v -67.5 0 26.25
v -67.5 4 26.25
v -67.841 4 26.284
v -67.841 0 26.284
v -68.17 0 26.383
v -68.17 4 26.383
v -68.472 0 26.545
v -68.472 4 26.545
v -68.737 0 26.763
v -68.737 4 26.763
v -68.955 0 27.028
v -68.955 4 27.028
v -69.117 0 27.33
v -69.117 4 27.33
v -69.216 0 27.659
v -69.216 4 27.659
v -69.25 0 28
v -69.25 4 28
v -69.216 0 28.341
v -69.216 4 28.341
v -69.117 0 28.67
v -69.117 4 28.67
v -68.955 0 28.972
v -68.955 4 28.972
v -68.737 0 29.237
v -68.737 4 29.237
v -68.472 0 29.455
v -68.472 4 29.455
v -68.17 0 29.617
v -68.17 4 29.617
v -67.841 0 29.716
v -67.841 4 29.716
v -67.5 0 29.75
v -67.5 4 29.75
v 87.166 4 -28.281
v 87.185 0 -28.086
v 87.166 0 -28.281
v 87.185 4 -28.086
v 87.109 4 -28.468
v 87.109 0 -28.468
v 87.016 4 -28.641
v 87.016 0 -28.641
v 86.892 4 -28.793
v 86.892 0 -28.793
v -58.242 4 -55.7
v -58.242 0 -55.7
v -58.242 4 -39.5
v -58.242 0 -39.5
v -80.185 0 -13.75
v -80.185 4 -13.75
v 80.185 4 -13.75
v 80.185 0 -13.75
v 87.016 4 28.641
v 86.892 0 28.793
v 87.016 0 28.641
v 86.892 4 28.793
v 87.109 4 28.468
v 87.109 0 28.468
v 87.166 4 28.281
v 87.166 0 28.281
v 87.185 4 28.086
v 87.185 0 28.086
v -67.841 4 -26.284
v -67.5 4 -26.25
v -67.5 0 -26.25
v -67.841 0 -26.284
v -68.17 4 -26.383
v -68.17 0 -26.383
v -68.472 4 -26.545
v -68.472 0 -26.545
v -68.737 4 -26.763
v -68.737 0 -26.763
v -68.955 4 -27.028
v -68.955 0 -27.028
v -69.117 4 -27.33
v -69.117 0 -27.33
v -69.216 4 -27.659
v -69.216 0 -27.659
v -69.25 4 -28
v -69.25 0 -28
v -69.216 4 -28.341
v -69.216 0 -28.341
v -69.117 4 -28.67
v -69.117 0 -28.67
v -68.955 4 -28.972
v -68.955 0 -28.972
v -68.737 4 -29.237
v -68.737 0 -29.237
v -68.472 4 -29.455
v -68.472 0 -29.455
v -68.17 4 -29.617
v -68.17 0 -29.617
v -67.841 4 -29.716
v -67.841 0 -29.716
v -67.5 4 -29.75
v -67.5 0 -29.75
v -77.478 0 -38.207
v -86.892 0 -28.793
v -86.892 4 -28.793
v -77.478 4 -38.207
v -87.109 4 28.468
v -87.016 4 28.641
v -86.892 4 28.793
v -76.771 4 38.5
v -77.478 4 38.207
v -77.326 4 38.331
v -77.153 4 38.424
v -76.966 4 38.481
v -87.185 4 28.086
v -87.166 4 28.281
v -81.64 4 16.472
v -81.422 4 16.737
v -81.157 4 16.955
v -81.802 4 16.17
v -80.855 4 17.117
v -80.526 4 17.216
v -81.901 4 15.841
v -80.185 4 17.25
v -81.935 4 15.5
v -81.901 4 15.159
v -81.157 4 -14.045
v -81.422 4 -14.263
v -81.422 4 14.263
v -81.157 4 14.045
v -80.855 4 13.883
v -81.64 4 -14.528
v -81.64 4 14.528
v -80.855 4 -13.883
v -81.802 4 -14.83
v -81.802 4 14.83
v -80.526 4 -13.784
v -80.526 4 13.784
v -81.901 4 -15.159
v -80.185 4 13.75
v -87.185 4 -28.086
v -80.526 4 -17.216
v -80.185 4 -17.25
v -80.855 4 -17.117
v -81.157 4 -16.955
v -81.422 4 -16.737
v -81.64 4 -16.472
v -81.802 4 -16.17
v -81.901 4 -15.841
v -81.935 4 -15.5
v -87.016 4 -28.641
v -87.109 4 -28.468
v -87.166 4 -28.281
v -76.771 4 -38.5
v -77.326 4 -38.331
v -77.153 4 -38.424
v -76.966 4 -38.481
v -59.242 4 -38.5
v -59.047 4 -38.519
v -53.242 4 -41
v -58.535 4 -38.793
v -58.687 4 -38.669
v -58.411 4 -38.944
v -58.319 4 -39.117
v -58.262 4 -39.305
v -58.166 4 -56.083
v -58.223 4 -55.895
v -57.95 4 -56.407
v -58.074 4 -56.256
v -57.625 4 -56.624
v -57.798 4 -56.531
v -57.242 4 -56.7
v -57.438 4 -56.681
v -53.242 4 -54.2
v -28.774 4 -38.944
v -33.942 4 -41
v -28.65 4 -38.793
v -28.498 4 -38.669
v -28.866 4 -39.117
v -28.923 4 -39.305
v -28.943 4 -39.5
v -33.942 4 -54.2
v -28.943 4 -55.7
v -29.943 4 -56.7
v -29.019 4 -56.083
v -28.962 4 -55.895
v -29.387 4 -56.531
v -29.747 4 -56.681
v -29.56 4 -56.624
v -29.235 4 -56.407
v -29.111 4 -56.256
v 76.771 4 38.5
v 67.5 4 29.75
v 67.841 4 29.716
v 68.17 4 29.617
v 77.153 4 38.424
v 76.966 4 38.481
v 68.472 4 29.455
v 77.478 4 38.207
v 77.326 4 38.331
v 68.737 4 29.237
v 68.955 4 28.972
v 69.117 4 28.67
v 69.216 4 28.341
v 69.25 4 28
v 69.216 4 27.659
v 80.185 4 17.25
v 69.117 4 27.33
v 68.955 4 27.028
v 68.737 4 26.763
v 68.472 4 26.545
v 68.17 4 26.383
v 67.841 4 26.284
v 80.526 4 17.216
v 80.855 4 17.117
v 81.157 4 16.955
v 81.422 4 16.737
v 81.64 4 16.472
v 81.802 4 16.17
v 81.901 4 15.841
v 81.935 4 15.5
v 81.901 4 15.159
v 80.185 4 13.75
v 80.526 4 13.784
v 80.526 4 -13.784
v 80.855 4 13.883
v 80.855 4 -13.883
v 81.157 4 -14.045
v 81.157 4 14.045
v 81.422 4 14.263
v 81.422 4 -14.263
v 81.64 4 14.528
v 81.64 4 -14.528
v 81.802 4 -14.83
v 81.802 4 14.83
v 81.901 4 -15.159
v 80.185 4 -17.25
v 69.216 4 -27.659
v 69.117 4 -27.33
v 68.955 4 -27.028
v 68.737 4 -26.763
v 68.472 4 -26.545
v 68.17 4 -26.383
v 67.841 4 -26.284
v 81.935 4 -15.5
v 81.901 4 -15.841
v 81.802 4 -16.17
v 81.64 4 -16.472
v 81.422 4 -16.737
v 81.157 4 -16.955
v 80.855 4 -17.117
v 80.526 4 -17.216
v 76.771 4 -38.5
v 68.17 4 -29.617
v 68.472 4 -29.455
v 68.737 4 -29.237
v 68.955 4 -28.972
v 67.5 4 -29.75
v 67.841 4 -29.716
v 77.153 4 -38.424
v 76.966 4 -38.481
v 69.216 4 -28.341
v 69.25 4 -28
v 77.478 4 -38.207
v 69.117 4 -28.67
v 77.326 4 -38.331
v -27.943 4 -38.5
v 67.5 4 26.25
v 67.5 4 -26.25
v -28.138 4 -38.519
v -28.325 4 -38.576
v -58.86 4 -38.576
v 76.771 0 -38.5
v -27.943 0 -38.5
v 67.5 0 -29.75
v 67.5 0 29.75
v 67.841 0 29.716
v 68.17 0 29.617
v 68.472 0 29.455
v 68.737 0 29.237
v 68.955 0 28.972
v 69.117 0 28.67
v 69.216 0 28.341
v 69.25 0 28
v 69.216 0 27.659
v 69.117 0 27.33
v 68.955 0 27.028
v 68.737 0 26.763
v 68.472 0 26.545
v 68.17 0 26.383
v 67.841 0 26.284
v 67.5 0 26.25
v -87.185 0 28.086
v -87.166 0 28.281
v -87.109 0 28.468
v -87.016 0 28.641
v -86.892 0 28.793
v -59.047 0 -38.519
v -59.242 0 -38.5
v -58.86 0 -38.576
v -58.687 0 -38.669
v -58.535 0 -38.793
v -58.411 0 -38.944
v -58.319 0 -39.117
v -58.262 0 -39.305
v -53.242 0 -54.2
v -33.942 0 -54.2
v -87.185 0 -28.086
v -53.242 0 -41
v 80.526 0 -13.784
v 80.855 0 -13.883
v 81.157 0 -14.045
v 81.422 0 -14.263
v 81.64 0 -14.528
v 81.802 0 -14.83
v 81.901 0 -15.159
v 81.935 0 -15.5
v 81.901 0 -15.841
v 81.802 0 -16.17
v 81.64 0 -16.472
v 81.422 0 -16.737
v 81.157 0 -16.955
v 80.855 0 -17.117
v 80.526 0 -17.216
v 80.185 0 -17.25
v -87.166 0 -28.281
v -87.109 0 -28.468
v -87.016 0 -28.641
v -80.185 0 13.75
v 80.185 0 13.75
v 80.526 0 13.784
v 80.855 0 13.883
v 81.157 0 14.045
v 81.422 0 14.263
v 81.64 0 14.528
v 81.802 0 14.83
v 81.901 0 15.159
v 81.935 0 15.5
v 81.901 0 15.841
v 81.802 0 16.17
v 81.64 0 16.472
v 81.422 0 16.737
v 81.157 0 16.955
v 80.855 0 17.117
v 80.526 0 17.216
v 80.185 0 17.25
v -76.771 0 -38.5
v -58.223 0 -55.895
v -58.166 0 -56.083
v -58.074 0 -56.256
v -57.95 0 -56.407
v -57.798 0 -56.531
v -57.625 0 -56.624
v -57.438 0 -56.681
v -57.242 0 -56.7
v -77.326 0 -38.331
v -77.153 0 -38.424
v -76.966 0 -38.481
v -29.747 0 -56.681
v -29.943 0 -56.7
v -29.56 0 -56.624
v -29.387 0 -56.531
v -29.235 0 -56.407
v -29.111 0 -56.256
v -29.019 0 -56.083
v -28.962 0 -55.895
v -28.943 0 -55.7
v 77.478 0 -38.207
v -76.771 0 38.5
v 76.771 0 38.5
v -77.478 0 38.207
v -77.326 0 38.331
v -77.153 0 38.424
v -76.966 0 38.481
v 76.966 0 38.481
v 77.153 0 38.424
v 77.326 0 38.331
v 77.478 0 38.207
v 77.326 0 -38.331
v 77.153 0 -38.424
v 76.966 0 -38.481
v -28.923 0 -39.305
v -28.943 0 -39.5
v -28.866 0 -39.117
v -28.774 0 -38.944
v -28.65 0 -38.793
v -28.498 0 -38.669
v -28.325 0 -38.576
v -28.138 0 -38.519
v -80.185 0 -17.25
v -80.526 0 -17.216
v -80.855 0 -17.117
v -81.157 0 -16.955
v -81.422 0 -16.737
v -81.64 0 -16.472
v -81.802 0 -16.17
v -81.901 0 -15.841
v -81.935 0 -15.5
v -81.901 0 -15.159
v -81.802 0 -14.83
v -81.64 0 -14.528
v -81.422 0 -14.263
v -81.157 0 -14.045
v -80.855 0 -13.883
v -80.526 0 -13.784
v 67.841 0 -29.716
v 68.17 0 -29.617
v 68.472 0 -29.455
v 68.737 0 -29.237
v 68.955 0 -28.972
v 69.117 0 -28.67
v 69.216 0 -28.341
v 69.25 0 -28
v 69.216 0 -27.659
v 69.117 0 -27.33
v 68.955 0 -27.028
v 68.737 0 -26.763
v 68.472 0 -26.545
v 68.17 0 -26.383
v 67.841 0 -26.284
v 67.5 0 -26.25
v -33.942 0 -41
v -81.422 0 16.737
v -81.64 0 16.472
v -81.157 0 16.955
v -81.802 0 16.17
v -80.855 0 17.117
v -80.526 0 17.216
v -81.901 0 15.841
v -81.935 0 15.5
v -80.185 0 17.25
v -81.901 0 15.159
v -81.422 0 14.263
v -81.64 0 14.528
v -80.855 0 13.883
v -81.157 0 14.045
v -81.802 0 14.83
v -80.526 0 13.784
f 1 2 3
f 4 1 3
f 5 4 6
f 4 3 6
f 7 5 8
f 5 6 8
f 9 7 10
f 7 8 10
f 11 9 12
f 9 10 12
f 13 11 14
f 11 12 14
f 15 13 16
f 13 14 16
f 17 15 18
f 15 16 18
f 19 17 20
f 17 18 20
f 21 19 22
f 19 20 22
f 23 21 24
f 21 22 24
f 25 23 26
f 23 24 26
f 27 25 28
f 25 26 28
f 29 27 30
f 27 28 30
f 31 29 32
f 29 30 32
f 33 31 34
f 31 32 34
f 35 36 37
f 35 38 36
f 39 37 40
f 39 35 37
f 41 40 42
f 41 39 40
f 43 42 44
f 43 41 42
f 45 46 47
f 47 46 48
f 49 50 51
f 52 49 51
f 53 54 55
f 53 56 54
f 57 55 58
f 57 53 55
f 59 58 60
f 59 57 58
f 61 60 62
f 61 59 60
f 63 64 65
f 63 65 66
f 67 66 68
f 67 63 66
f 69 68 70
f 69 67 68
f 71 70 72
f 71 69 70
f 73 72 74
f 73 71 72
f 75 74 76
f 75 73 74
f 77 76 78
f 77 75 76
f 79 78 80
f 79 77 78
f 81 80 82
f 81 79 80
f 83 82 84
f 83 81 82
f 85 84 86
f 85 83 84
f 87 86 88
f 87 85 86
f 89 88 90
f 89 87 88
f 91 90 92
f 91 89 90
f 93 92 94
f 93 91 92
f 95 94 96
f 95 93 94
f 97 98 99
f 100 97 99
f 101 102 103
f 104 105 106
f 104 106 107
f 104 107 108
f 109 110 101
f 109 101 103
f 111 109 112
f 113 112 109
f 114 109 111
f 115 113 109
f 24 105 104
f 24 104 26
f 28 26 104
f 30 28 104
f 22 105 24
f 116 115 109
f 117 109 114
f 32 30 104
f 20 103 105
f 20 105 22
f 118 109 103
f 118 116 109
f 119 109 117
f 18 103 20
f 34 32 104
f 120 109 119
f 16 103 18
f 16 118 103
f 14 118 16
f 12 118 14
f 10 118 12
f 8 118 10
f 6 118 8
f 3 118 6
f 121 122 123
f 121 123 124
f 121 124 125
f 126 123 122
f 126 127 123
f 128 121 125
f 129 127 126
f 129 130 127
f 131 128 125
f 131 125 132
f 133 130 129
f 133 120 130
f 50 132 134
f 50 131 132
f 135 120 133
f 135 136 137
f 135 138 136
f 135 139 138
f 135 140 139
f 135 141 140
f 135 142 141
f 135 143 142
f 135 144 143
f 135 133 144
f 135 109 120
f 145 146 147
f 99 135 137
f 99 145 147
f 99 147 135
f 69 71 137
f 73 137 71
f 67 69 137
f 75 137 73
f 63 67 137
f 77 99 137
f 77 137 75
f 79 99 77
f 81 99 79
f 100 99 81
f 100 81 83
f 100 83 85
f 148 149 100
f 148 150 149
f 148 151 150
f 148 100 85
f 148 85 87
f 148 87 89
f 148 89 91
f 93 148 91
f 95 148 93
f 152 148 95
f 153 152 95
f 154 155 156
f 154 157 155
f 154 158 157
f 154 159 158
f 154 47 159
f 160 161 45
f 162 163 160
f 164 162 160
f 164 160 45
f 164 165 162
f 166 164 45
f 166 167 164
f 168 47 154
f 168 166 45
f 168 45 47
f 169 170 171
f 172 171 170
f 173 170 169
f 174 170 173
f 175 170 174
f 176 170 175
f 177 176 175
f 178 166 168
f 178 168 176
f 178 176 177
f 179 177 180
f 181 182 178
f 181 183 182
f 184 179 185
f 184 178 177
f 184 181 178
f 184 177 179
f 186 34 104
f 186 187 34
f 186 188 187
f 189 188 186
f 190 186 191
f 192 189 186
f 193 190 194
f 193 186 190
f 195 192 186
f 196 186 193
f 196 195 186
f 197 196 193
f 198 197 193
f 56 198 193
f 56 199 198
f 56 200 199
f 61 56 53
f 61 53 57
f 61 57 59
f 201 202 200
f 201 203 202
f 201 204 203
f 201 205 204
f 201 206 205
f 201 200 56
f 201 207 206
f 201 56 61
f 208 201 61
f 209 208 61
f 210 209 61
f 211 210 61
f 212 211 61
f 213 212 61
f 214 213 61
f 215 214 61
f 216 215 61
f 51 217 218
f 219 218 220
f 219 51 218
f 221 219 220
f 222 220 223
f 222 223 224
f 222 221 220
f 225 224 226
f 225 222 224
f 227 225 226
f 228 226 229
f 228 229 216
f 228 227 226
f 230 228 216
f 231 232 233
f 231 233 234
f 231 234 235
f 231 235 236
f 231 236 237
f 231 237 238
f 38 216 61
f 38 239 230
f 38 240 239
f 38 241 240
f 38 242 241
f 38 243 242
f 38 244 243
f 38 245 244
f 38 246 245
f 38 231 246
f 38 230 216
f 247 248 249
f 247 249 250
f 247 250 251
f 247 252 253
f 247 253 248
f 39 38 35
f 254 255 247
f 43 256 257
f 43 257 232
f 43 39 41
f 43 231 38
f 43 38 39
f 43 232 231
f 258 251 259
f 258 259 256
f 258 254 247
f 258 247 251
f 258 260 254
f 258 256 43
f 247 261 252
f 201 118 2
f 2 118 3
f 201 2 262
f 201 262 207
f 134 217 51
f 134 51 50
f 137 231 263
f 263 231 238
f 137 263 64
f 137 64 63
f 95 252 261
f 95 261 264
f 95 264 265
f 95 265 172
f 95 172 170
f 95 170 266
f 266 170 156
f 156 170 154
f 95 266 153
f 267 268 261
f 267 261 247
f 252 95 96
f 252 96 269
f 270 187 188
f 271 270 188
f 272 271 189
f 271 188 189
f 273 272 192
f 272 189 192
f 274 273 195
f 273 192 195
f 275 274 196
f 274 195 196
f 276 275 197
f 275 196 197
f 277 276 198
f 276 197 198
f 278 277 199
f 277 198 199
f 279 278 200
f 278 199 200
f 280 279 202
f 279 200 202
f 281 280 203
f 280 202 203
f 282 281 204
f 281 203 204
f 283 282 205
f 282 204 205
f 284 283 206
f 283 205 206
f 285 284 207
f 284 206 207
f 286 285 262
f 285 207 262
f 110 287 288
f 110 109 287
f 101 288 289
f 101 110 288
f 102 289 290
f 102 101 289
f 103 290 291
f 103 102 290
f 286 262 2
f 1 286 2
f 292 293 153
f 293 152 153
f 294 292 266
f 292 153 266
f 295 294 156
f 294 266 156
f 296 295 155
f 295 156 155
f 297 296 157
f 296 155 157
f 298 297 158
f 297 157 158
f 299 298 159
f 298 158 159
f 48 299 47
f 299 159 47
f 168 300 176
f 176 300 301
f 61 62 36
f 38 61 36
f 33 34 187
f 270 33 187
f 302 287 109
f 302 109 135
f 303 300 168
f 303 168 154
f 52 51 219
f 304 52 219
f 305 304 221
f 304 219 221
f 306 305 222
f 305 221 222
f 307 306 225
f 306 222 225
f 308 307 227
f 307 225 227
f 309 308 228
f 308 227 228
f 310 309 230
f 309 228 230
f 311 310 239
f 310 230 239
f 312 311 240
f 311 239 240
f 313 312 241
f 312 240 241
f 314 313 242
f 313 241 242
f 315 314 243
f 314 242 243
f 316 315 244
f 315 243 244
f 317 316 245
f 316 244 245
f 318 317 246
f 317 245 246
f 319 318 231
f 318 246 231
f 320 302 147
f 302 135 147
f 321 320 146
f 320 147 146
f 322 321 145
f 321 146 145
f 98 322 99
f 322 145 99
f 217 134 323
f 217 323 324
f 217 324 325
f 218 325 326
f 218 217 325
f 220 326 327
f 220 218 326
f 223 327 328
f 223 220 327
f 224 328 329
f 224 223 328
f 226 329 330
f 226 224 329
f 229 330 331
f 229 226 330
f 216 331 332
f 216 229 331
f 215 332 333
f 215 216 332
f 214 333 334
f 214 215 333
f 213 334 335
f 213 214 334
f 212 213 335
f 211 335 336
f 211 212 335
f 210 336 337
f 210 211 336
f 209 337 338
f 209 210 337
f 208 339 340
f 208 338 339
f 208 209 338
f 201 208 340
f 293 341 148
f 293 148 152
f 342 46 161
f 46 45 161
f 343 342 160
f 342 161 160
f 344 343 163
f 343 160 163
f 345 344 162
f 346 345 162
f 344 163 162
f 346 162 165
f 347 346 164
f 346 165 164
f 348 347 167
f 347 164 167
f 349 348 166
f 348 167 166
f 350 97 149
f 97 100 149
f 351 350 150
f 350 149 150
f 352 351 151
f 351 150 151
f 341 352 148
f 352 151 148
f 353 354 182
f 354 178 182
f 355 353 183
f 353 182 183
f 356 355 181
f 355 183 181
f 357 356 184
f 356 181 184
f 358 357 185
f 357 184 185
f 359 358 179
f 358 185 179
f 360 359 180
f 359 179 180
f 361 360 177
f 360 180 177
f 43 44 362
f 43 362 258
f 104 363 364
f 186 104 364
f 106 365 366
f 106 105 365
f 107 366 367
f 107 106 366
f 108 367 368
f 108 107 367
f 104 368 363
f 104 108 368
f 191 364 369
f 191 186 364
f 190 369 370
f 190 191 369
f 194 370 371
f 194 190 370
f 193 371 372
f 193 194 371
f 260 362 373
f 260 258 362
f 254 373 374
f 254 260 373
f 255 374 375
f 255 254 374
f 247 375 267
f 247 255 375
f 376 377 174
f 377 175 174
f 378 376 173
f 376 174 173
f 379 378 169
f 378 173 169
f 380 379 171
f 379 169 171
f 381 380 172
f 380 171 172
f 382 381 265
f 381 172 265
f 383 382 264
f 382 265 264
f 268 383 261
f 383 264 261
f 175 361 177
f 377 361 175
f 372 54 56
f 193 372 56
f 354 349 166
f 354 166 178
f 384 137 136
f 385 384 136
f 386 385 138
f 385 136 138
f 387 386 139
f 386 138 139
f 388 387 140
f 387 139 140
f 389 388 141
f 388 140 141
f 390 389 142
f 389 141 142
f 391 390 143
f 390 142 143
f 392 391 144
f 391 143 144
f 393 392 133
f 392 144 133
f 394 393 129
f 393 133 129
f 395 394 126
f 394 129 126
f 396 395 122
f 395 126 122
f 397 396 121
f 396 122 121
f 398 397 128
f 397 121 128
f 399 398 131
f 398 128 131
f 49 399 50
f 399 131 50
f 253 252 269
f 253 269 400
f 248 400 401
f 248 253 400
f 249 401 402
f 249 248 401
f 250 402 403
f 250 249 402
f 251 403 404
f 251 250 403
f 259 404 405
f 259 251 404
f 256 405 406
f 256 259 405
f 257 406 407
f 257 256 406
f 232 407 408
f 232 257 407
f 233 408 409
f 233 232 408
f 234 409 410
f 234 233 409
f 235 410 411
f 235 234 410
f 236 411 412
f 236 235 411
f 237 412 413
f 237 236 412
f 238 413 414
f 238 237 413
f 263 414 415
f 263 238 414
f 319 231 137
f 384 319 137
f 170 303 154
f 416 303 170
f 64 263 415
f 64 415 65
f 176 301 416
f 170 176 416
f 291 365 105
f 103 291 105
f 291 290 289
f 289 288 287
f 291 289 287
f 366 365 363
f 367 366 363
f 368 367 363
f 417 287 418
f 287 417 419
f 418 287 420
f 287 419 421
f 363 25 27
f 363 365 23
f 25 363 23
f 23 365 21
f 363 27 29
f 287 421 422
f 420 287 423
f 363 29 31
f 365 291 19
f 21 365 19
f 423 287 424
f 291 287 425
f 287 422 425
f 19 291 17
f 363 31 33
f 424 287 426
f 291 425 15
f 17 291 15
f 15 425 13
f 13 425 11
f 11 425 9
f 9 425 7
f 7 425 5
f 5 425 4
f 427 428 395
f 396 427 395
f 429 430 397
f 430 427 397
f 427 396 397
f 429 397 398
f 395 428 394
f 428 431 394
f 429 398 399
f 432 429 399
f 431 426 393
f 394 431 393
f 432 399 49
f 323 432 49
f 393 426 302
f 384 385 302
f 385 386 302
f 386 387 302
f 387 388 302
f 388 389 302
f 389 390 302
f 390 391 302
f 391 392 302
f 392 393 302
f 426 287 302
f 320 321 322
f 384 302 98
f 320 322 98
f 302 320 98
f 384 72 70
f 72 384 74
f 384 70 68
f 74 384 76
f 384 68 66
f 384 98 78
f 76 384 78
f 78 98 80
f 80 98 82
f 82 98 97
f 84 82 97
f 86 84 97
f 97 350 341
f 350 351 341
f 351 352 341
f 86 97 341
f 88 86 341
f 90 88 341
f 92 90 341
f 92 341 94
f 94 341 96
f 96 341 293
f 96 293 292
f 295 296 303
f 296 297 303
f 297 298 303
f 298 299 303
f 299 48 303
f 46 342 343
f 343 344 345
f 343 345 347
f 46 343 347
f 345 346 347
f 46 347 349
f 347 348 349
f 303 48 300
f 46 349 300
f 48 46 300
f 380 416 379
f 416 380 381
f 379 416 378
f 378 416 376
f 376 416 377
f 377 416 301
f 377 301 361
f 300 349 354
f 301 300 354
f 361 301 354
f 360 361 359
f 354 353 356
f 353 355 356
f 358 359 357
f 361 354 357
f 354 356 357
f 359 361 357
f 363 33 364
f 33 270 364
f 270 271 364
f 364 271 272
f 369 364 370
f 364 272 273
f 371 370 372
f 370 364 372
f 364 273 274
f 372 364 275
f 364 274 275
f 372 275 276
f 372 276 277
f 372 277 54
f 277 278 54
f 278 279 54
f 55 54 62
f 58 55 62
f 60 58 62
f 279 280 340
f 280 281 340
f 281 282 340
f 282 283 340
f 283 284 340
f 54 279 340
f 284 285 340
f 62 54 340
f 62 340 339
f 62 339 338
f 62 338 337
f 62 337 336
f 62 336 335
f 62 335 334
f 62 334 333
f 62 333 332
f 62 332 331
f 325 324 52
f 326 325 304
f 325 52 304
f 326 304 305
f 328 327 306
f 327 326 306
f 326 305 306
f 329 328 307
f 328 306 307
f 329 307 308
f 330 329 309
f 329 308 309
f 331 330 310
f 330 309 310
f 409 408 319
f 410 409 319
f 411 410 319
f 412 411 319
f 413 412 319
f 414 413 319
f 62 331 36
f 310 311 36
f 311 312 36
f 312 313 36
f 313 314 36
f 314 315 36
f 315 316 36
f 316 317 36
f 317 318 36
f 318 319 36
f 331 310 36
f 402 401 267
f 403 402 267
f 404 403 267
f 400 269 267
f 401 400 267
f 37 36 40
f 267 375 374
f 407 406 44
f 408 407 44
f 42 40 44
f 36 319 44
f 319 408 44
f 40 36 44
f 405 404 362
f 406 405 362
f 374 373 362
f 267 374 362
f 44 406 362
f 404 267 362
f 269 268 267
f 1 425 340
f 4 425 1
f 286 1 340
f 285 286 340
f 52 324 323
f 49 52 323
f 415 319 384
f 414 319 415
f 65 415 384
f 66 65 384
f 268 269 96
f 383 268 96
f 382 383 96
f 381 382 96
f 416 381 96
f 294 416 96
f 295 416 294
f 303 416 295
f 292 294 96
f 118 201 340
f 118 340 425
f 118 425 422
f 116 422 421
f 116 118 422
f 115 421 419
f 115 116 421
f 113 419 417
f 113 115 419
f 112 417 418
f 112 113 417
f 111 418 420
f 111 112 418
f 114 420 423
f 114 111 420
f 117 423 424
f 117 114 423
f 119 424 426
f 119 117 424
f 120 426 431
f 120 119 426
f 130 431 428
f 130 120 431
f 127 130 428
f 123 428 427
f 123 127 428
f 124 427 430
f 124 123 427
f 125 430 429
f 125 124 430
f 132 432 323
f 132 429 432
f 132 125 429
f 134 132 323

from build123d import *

# Parameters (mm, degrees)
SKETCH2_W           = 174.37
SKETCH2_H           = 77
BOSS_EXTRUDE1_DEPTH = 4
CUT_EXTRUDE1_DEPTH  = 4
SKETCH4_W           = 29.3
SKETCH4_H           = 18.2
SKETCH4_W_2         = 19.3
SKETCH4_H_2         = 13.2
BOSS_EXTRUDE2_DEPTH = 4
CHAMFER1_SIZE       = 10
FILLET1_R           = 1
CUT_EXTRUDE2_DEPTH  = 10


with BuildPart() as part:
    # Sketch2 → Boss-Extrude1 (new body)
    with BuildSketch(Plane(origin=(0, 0, 0), x_dir=(1, 0, 0), z_dir=(0, 1, 0))):
        Rectangle(SKETCH2_W, SKETCH2_H)
    extrude(amount=BOSS_EXTRUDE1_DEPTH)

    # Sketch3 → Cut-Extrude1 (cut)
    with BuildSketch(Plane(origin=(0, 4, 0), x_dir=(1, 0, 0), z_dir=(0, 1, 0))):
        with BuildLine():
            Line((-67.5, 29.75), (67.5, 29.75))
            ThreePointArc((67.5, 29.75), (69.25, 28), (67.5, 26.25))
            Line((67.5, 26.25), (-67.5, 26.25))
            ThreePointArc((-67.5, 26.25), (-69.25, 28), (-67.5, 29.75))
        make_face()
        with BuildLine():
            Line((-67.5, -29.75), (67.5, -29.75))
            ThreePointArc((67.5, -29.75), (69.25, -28), (67.5, -26.25))
            Line((67.5, -26.25), (-67.5, -26.25))
            ThreePointArc((-67.5, -26.25), (-69.25, -28), (-67.5, -29.75))
        make_face()
    extrude(amount=-CUT_EXTRUDE1_DEPTH, mode=Mode.SUBTRACT)

    # Sketch4 → Boss-Extrude2 (add)
    with BuildSketch(Plane.XZ):
        with Locations((-43.5925, -47.6)):
            Rectangle(SKETCH4_W, SKETCH4_H)
        with Locations((-43.5925, -47.6)):
            Rectangle(SKETCH4_W_2, SKETCH4_H_2, mode=Mode.SUBTRACT)
    extrude(amount=-BOSS_EXTRUDE2_DEPTH)

    # Chamfer1
    chamfer1_edges = [part.edges().sort_by_distance(p)[0] for p in [
        (-87.185, 2, -38.5),
        (87.185, 2, -38.5),
        (87.185, 2, 38.5),
        (-87.185, 2, 38.5),
    ]]
    chamfer(chamfer1_edges, length=CHAMFER1_SIZE)

    # Fillet1
    fillet1_edges = [part.edges().sort_by_distance(p)[0] for p in [
        (-58.2425, 2, -56.7),
        (-58.2425, 2, -38.5),
        (-28.9425, 2, -38.5),
        (-28.9425, 2, -56.7),
        (-87.185, 2, 28.5),
        (-87.185, 2, -28.5),
        (-77.185, 2, -38.5),
        (77.185, 2, -38.5),
        (87.185, 2, 28.5),
        (87.185, 2, -28.5),
        (-77.185, 2, 38.5),
        (77.185, 2, 38.5),
    ]]
    fillet(fillet1_edges, radius=FILLET1_R)

    # Sketch5 → Cut-Extrude2 (cut)
    with BuildSketch(Plane(origin=(0, 4, 0), x_dir=(1, 0, 0), z_dir=(0, 1, 0))):
        with BuildLine():
            Line((-80.185, 13.75), (80.185, 13.75))
            ThreePointArc((80.185, 13.75), (81.935, 15.5), (80.185, 17.25))
            Line((80.185, 17.25), (-80.185, 17.25))
            ThreePointArc((-80.185, 17.25), (-81.935, 15.5), (-80.185, 13.75))
        make_face()
        with BuildLine():
            Line((80.185, -17.25), (-80.185, -17.25))
            ThreePointArc((-80.185, -17.25), (-81.935, -15.5), (-80.185, -13.75))
            Line((-80.185, -13.75), (80.185, -13.75))
            ThreePointArc((80.185, -13.75), (81.935, -15.5), (80.185, -17.25))
        make_face()
    extrude(amount=-CUT_EXTRUDE2_DEPTH, mode=Mode.SUBTRACT)


solid = part.part
